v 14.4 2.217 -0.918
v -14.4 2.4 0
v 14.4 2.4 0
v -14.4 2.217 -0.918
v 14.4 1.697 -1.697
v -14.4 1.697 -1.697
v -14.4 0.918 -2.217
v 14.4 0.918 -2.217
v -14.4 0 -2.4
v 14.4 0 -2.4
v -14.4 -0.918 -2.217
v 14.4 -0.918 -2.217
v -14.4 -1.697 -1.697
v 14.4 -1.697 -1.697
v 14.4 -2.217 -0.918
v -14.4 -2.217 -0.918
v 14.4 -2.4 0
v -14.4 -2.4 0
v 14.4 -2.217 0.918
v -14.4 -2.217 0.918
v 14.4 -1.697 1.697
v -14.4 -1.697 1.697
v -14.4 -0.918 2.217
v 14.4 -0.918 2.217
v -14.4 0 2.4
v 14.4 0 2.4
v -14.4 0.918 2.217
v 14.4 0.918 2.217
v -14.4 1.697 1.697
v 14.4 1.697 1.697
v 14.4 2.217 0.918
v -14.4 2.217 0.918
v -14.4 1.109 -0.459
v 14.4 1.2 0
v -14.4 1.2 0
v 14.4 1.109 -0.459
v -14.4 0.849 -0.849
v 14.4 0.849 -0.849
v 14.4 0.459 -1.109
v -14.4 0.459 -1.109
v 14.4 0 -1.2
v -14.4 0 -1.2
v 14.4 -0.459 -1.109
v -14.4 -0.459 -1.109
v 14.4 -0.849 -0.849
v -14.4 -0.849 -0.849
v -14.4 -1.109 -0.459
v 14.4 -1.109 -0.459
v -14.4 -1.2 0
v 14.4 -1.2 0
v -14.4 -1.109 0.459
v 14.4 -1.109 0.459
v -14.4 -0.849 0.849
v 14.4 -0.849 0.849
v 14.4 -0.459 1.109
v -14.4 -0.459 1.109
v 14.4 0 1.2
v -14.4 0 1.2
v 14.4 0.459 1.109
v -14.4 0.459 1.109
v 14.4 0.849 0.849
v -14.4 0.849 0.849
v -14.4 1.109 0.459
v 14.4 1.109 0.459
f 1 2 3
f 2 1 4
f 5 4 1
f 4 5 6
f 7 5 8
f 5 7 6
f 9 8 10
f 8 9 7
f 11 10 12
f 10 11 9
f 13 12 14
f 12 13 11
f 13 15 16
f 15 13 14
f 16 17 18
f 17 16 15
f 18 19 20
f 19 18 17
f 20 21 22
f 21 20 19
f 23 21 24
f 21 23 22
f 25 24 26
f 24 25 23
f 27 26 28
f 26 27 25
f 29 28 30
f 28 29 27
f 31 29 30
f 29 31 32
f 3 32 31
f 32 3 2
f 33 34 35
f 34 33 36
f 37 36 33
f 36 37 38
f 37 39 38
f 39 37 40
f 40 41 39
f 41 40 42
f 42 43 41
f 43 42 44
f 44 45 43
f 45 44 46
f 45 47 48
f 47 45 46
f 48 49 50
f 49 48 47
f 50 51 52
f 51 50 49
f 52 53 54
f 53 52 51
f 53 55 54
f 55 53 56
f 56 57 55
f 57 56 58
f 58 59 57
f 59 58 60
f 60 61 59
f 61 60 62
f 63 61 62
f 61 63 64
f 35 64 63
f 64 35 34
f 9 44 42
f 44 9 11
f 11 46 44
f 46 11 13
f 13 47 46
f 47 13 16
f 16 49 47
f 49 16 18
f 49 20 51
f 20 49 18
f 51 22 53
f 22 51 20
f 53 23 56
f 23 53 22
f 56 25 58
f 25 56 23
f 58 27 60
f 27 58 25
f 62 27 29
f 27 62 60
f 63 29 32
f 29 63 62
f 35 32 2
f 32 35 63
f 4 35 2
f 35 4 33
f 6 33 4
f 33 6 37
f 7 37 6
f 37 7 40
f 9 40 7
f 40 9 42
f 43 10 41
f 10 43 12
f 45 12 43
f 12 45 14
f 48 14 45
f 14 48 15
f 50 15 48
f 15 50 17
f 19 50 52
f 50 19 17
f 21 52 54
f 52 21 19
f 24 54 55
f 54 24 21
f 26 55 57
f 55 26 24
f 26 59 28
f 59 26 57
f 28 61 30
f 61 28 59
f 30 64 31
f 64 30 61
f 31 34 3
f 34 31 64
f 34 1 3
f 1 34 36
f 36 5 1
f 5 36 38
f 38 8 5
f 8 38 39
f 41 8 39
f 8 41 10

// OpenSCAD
// file: ../p/4-4disc.scad
use <../lib.scad>
$fa=1; $fs=0.2;
function ldraw_lib__4_4disc(realsolid=false) = [
// 0 Disc 1.0
// 0 Name: 4-4disc.dat
// 0 Author: James Jessiman
// 0 !LDRAW_ORG Primitive UPDATE 2002-02
// 0 !LICENSE Licensed under CC BY 2.0 and CC BY 4.0 : see CAreadme.txt
// 
// 0 BFC CERTIFY CCW
  [0,"BFC","CERTIFY"],
  [0,"BFC","CCW"],
// 
// 0 !HISTORY 1998-12-15 [PTadmin] Official Update 1998-10
// 0 !HISTORY 2002-03-23 [sbliss] Added BFC statement
// 0 !HISTORY 2002-04-25 [PTadmin] Official Update 2002-02
// 0 !HISTORY 2007-06-24 [PTadmin] Header formatted for Contributor Agreement
// 0 !HISTORY 2008-07-01 [PTadmin] Official Update 2008-01
// 
// 
// 3 16 0 0 0 1 0 0 0.9239 0 0.3827
  [3,16,0,0,0,1,0,0,0.9239,0,0.3827],
// 3 16 0 0 0 0.9239 0 0.3827 0.7071 0 0.7071
  [3,16,0,0,0,0.9239,0,0.3827,0.7071,0,0.7071],
// 3 16 0 0 0 0.7071 0 0.7071 0.3827 0 0.9239
  [3,16,0,0,0,0.7071,0,0.7071,0.3827,0,0.9239],
// 3 16 0 0 0 0.3827 0 0.9239 0 0 1
  [3,16,0,0,0,0.3827,0,0.9239,0,0,1],
// 3 16 0 0 0 0 0 1 -0.3827 0 0.9239
  [3,16,0,0,0,0,0,1,-0.3827,0,0.9239],
// 3 16 0 0 0 -0.3827 0 0.9239 -0.7071 0 0.7071
  [3,16,0,0,0,-0.3827,0,0.9239,-0.7071,0,0.7071],
// 3 16 0 0 0 -0.7071 0 0.7071 -0.9239 0 0.3827
  [3,16,0,0,0,-0.7071,0,0.7071,-0.9239,0,0.3827],
// 3 16 0 0 0 -0.9239 0 0.3827 -1 0 -0
  [3,16,0,0,0,-0.9239,0,0.3827,-1,0,-0],
// 3 16 0 0 0 -1 0 -0 -0.9239 0 -0.3827
  [3,16,0,0,0,-1,0,-0,-0.9239,0,-0.3827],
// 3 16 0 0 0 -0.9239 0 -0.3827 -0.7071 0 -0.7071
  [3,16,0,0,0,-0.9239,0,-0.3827,-0.7071,0,-0.7071],
// 3 16 0 0 0 -0.7071 0 -0.7071 -0.3827 0 -0.9239
  [3,16,0,0,0,-0.7071,0,-0.7071,-0.3827,0,-0.9239],
// 3 16 0 0 0 -0.3827 0 -0.9239 0 0 -1
  [3,16,0,0,0,-0.3827,0,-0.9239,0,0,-1],
// 3 16 0 0 0 0 0 -1 0.3827 0 -0.9239
  [3,16,0,0,0,0,0,-1,0.3827,0,-0.9239],
// 3 16 0 0 0 0.3827 0 -0.9239 0.7071 0 -0.7071
  [3,16,0,0,0,0.3827,0,-0.9239,0.7071,0,-0.7071],
// 3 16 0 0 0 0.7071 0 -0.7071 0.9239 0 -0.3827
  [3,16,0,0,0,0.7071,0,-0.7071,0.9239,0,-0.3827],
// 3 16 0 0 0 0.9239 0 -0.3827 1 0 0
  [3,16,0,0,0,0.9239,0,-0.3827,1,0,0],
// 0
];
module ldraw_lib__4_4disc(step=0, col=false, unit=2/5, alt=false, line=0.2, solid=!$preview)
    makepoly(ldraw_lib__4_4disc(solid), step=step, col=col, unit=unit, alt=alt, line=line, solid=solid);
ldraw_lib__4_4disc(line=0.2);
// file: ../p/stud3.scad
use <../lib.scad>
use <4-4cyli.scad>
use <4-4disc.scad>
use <4-4edge.scad>
$fa=1; $fs=0.2;
function ldraw_lib__stud3(realsolid=false) = realsolid ? 
    [openscad(translate([0,0,-eps()], o=cylinder(4+eps(), r=4)),2)] : [
// 0 Stud Tube Solid
// 0 Name: stud3.dat
// 0 Author: James Jessiman
// 0 !LDRAW_ORG Primitive UPDATE 2012-01
// 0 !LICENSE Licensed under CC BY 2.0 and CC BY 4.0 : see CAreadme.txt
// 
// 0 BFC CERTIFY CCW
  [0,"BFC","CERTIFY"],
  [0,"BFC","CCW"],
// 
// 0 !HISTORY 2002-04-04 [sbliss] Modified for BFC compliance
// 0 !HISTORY 2002-04-25 [PTadmin] Official Update 2002-02
// 0 !HISTORY 2007-06-24 [PTadmin] Header formatted for Contributor Agreement
// 0 !HISTORY 2008-07-01 [PTadmin] Official Update 2008-01
// 0 !HISTORY 2012-02-16 [Philo] Changed to CCW
// 0 !HISTORY 2012-03-30 [PTadmin] Official Update 2012-01
// 
// 
// 1 16 0 -4 0 4 0 0 0 1 0 0 0 4 4-4edge.dat
  [1,16,0,-4,0,4,0,0,0,1,0,0,0,4, ldraw_lib__4_4edge(realsolid)],
// 1 16 0 0 0 4 0 0 0 1 0 0 0 4 4-4edge.dat
  [1,16,0,0,0,4,0,0,0,1,0,0,0,4, ldraw_lib__4_4edge(realsolid)],
// 1 16 0 -4 0 4 0 0 0 1 0 0 0 4 4-4disc.dat
  [1,16,0,-4,0,4,0,0,0,1,0,0,0,4, ldraw_lib__4_4disc(realsolid)],
// 1 16 0 -4 0 4 0 0 0 4 0 0 0 4 4-4cyli.dat
  [1,16,0,-4,0,4,0,0,0,4,0,0,0,4, ldraw_lib__4_4cyli(realsolid)],
];
module ldraw_lib__stud3(step=0, col=false, unit=2/5, alt=false, line=0.2, solid=!$preview)
    makepoly(ldraw_lib__stud3(solid), step=step, col=col, unit=unit, alt=alt, line=line, solid=solid);
ldraw_lib__stud3(line=0.2);
// file: ../p/stud.scad
use <../lib.scad>
use <4-4cyli.scad>
use <4-4disc.scad>
use <4-4edge.scad>
$fa=1; $fs=0.2;
function ldraw_lib__stud(realsolid=false) = realsolid ? 
    [openscad(translate([0,0,-eps()], o=cylinder(4+eps(), r=6)),2)] : [
// 0 Stud
// 0 Name: stud.dat
// 0 Author: James Jessiman
// 0 !LDRAW_ORG Primitive UPDATE 2012-01
// 0 !LICENSE Licensed under CC BY 2.0 and CC BY 4.0 : see CAreadme.txt
// 
// 0 BFC CERTIFY CCW
  [0,"BFC","CERTIFY"],
  [0,"BFC","CCW"],
// 
// 0 !HISTORY 2002-04-04 [sbliss] Modified for BFC compliance
// 0 !HISTORY 2002-04-25 [PTadmin] Official Update 2002-02
// 0 !HISTORY 2007-06-24 [PTadmin] Header formatted for Contributor Agreement
// 0 !HISTORY 2008-07-01 [PTadmin] Official Update 2008-01
// 0 !HISTORY 2012-02-16 [Philo] Changed to CCW
// 0 !HISTORY 2012-03-30 [PTadmin] Official Update 2012-01
// 
// 
// 1 16 0 0 0 6 0 0 0 1 0 0 0 6 4-4edge.dat
  [1,16,0,0,0,6,0,0,0,1,0,0,0,6, ldraw_lib__4_4edge(realsolid)],
// 1 16 0 -4 0 6 0 0 0 1 0 0 0 6 4-4edge.dat
  [1,16,0,-4,0,6,0,0,0,1,0,0,0,6, ldraw_lib__4_4edge(realsolid)],
// 1 16 0 0 0 6 0 0 0 -4 0 0 0 6 4-4cyli.dat
  [1,16,0,0,0,6,0,0,0,-4,0,0,0,6, ldraw_lib__4_4cyli(realsolid)],
// 1 16 0 -4 0 6 0 0 0 1 0 0 0 6 4-4disc.dat
  [1,16,0,-4,0,6,0,0,0,1,0,0,0,6, ldraw_lib__4_4disc(realsolid)],
];
module ldraw_lib__stud(step=0, col=false, unit=2/5, alt=false, line=0.2, solid=!$preview)
    makepoly(ldraw_lib__stud(solid), step=step, col=col, unit=unit, alt=alt, line=line, solid=solid);
ldraw_lib__stud(line=0.2);
// file: ../p/box5.scad
use <../lib.scad>
$fa=1; $fs=0.2;
function ldraw_lib__box5(realsolid=false) = [
// 0 Box with 5 Faces and All Edges
// 0 Name: box5.dat
// 0 Author: James Jessiman
// 0 !LDRAW_ORG Primitive UPDATE 2012-01
// 0 !LICENSE Licensed under CC BY 2.0 and CC BY 4.0 : see CAreadme.txt
// 
// 0 BFC CERTIFY CCW
  [0,"BFC","CERTIFY"],
  [0,"BFC","CCW"],
// 
// 0 !HISTORY 2002-04-03 [sbliss] Modified for BFC compliance
// 0 !HISTORY 2002-04-25 [PTadmin] Official Update 2002-02
// 0 !HISTORY 2007-06-24 [PTadmin] Header formatted for Contributor Agreement
// 0 !HISTORY 2008-07-01 [PTadmin] Official Update 2008-01
// 0 !HISTORY 2012-02-16 [Philo] Changed to CCW
// 0 !HISTORY 2012-03-30 [PTadmin] Official Update 2012-01
// 
// 
// 2 24 1 1 1 -1 1 1
  [2,24,1,1,1,-1,1,1],
// 2 24 -1 1 1 -1 1 -1
  [2,24,-1,1,1,-1,1,-1],
// 2 24 -1 1 -1 1 1 -1
  [2,24,-1,1,-1,1,1,-1],
// 2 24 1 1 -1 1 1 1
  [2,24,1,1,-1,1,1,1],
// 2 24 1 0 1 -1 0 1
  [2,24,1,0,1,-1,0,1],
// 2 24 -1 0 1 -1 0 -1
  [2,24,-1,0,1,-1,0,-1],
// 2 24 -1 0 -1 1 0 -1
  [2,24,-1,0,-1,1,0,-1],
// 2 24 1 0 -1 1 0 1
  [2,24,1,0,-1,1,0,1],
// 2 24 1 0 1 1 1 1
  [2,24,1,0,1,1,1,1],
// 2 24 -1 0 1 -1 1 1
  [2,24,-1,0,1,-1,1,1],
// 2 24 1 0 -1 1 1 -1
  [2,24,1,0,-1,1,1,-1],
// 2 24 -1 0 -1 -1 1 -1
  [2,24,-1,0,-1,-1,1,-1],
// 4 16 -1 1 1 1 1 1 1 1 -1 -1 1 -1
  [4,16,-1,1,1,1,1,1,1,1,-1,-1,1,-1],
// 4 16 -1 1 1 -1 0 1 1 0 1 1 1 1
  [4,16,-1,1,1,-1,0,1,1,0,1,1,1,1],
// 4 16 -1 1 -1 -1 0 -1 -1 0 1 -1 1 1
  [4,16,-1,1,-1,-1,0,-1,-1,0,1,-1,1,1],
// 4 16 1 1 -1 1 0 -1 -1 0 -1 -1 1 -1
  [4,16,1,1,-1,1,0,-1,-1,0,-1,-1,1,-1],
// 4 16 1 1 1 1 0 1 1 0 -1 1 1 -1
  [4,16,1,1,1,1,0,1,1,0,-1,1,1,-1],
];
module ldraw_lib__box5(step=0, col=false, unit=2/5, alt=false, line=0.2, solid=!$preview)
    makepoly(ldraw_lib__box5(solid), step=step, col=col, unit=unit, alt=alt, line=line, solid=solid);
ldraw_lib__box5(line=0.2);
// file: ../p/box4t.scad
use <../lib.scad>
$fa=1; $fs=0.2;
function ldraw_lib__box4t(realsolid=false) = [
// 0 Box with 4 Adjacent Faces and All Edges
// 0 Name: box4t.dat
// 0 Author: Tore Eriksson [Tore_Eriksson]
// 0 !LDRAW_ORG Primitive UPDATE 2003-02
// 0 !LICENSE Licensed under CC BY 2.0 and CC BY 4.0 : see CAreadme.txt
// 
// 0 BFC CERTIFY CCW
  [0,"BFC","CERTIFY"],
  [0,"BFC","CCW"],
// 
// 0 !HISTORY 1997-09-29 [PTadmin] Official Update 1997-15
// 0 !HISTORY 2002-08-31 [izanette] Modified with WINDZ for BFC compliance
// 0 !HISTORY 2003-08-01 [PTadmin] Official Update 2003-02
// 0 !HISTORY 2007-06-24 [PTadmin] Header formatted for Contributor Agreement
// 0 !HISTORY 2008-07-01 [PTadmin] Official Update 2008-01
// 
// 
// 2 24 1 1 1 -1 1 1
  [2,24,1,1,1,-1,1,1],
// 2 24 -1 1 1 -1 1 -1
  [2,24,-1,1,1,-1,1,-1],
// 2 24 -1 1 -1 1 1 -1
  [2,24,-1,1,-1,1,1,-1],
// 2 24 1 1 -1 1 1 1
  [2,24,1,1,-1,1,1,1],
// 2 24 1 0 1 -1 0 1
  [2,24,1,0,1,-1,0,1],
// 2 24 -1 0 1 -1 0 -1
  [2,24,-1,0,1,-1,0,-1],
// 2 24 -1 0 -1 1 0 -1
  [2,24,-1,0,-1,1,0,-1],
// 2 24 1 0 -1 1 0 1
  [2,24,1,0,-1,1,0,1],
// 2 24 1 0 1 1 1 1
  [2,24,1,0,1,1,1,1],
// 2 24 -1 0 1 -1 1 1
  [2,24,-1,0,1,-1,1,1],
// 2 24 1 0 -1 1 1 -1
  [2,24,1,0,-1,1,1,-1],
// 2 24 -1 0 -1 -1 1 -1
  [2,24,-1,0,-1,-1,1,-1],
// 4 16 1 1 1 1 1 -1 -1 1 -1 -1 1 1
  [4,16,1,1,1,1,1,-1,-1,1,-1,-1,1,1],
// 4 16 1 1 1 -1 1 1 -1 0 1 1 0 1
  [4,16,1,1,1,-1,1,1,-1,0,1,1,0,1],
// 4 16 -1 1 1 -1 1 -1 -1 0 -1 -1 0 1
  [4,16,-1,1,1,-1,1,-1,-1,0,-1,-1,0,1],
// 0 4 16 -1 1 -1 -1 0 -1 1 0 -1 1 1 -1
// 4 16 1 1 -1 1 1 1 1 0 1 1 0 -1
  [4,16,1,1,-1,1,1,1,1,0,1,1,0,-1],
// 0
];
module ldraw_lib__box4t(step=0, col=false, unit=2/5, alt=false, line=0.2, solid=!$preview)
    makepoly(ldraw_lib__box4t(solid), step=step, col=col, unit=unit, alt=alt, line=line, solid=solid);
ldraw_lib__box4t(line=0.2);
// file: s/3004s01.scad
use <../../lib.scad>
use <../../p/box4t.scad>
use <../../p/box5.scad>
use <../../p/stud.scad>
use <../../p/stud3.scad>
$fa=1; $fs=0.2;
function ldraw_lib__s__3004s01(realsolid=false) = [
// 0 ~Brick  1 x  2 without Front Face
// 0 Name: s\3004s01.dat
// 0 Author: James Jessiman
// 0 !LDRAW_ORG Subpart UPDATE 2003-03
// 0 !LICENSE Licensed under CC BY 2.0 and CC BY 4.0 : see CAreadme.txt
// 
// 0 BFC CERTIFY CCW
  [0,"BFC","CERTIFY"],
  [0,"BFC","CCW"],
// 
// 0 !HISTORY 2003-09-07 [jriley] Subfiling, BFC
// 0 !HISTORY 2003-12-19 [PTadmin] Official Update 2003-03
// 0 !HISTORY 2007-08-29 [PTadmin] Header formatted for Contributor Agreement
// 0 !HISTORY 2008-07-01 [PTadmin] Official Update 2008-01
// 
// 
// 1 16 0 4 0 1 0 0 0 -5 0 0 0 1 stud3.dat
  [1,16,0,4,0,1,0,0,0,-5,0,0,0,1, ldraw_lib__stud3(realsolid)],
// 0 BFC INVERTNEXT
  [0,"BFC","INVERTNEXT"],
// 1 16 0 24 0 16 0 0 0 -20 0 0 0 6 box5.dat
  [1,16,0,24,0,16,0,0,0,-20,0,0,0,6, ldraw_lib__box5(realsolid)],
// 4 16 20 24 10 16 24 6 -16 24 6 -20 24 10
  [4,16,20,24,10,16,24,6,-16,24,6,-20,24,10],
// 4 16 -20 24 10 -16 24 6 -16 24 -6 -20 24 -10
  [4,16,-20,24,10,-16,24,6,-16,24,-6,-20,24,-10],
// 4 16 -20 24 -10 -16 24 -6 16 24 -6 20 24 -10
  [4,16,-20,24,-10,-16,24,-6,16,24,-6,20,24,-10],
// 4 16 20 24 -10 16 24 -6 16 24 6 20 24 10
  [4,16,20,24,-10,16,24,-6,16,24,6,20,24,10],
// 1 16 0 24 0 20 0 0 0 -24 0 0 0 10 box4t.dat
  [1,16,0,24,0,20,0,0,0,-24,0,0,0,10, ldraw_lib__box4t(realsolid)],
// 1 16 10 0 0 1 0 0 0 1 0 0 0 1 stud.dat
  [1,16,10,0,0,1,0,0,0,1,0,0,0,1, ldraw_lib__stud(realsolid)],
// 1 16 -10 0 0 1 0 0 0 1 0 0 0 1 stud.dat
  [1,16,-10,0,0,1,0,0,0,1,0,0,0,1, ldraw_lib__stud(realsolid)],
// 0
];
module ldraw_lib__s__3004s01(step=0, col=false, unit=2/5, alt=false, line=0.2, solid=!$preview)
    makepoly(ldraw_lib__s__3004s01(solid), step=step, col=col, unit=unit, alt=alt, line=line, solid=solid);
ldraw_lib__s__3004s01(line=0.2);
// file: 3004.scad
use <../lib.scad>
use <s/3004s01.scad>
$fa=1; $fs=0.2;
function ldraw_lib__3004(realsolid=false) = [
// 0 Brick  1 x  2
// 0 Name: 3004.dat
// 0 Author: James Jessiman
// 0 !LDRAW_ORG Part UPDATE 2022-05
// 0 !LICENSE Licensed under CC BY 2.0 and CC BY 4.0 : see CAreadme.txt
// 
// 0 BFC CERTIFY CCW
  [0,"BFC","CERTIFY"],
  [0,"BFC","CCW"],
// 
// 0 !HISTORY 2001-10-26 [PTadmin] Official Update 2001-01
// 0 !HISTORY 2002-05-07 {unknown} BFC Certification
// 0 !HISTORY 2002-06-11 [PTadmin] Official Update 2002-03
// 0 !HISTORY 2007-05-07 [PTadmin] Header formatted for Contributor Agreement
// 0 !HISTORY 2008-07-01 [PTadmin] Official Update 2008-01
// 0 !HISTORY 2022-08-04 [MagFors] Using subfile
// 0 !HISTORY 2022-09-15 [PTadmin] Official Update 2022-05
// 
// 
// 1 16 0 0 0 1 0 0 0 1 0 0 0 1 s\3004s01.dat
  [1,16,0,0,0,1,0,0,0,1,0,0,0,1, ldraw_lib__s__3004s01(realsolid)],
// 4 16 -20 24 -10 20 24 -10 20 0 -10 -20 0 -10
  [4,16,-20,24,-10,20,24,-10,20,0,-10,-20,0,-10],
];
module ldraw_lib__3004(step=0, col=false, unit=2/5, alt=false, line=0.2, solid=!$preview)
    makepoly(ldraw_lib__3004(solid), step=step, col=col, unit=unit, alt=alt, line=line, solid=solid);
ldraw_lib__3004(line=0.2);
// file: ../p/4-4ring1.scad
use <../lib.scad>
$fa=1; $fs=0.2;
function ldraw_lib__4_4ring1(realsolid=false) = [
// 0 Ring  1 x 1.0
// 0 Name: 4-4ring1.dat
// 0 Author: James Jessiman
// 0 !LDRAW_ORG Primitive UPDATE 2009-01
// 0 !LICENSE Licensed under CC BY 2.0 and CC BY 4.0 : see CAreadme.txt
// 
// 0 BFC CERTIFY CCW
  [0,"BFC","CERTIFY"],
  [0,"BFC","CCW"],
// 
// 0 !HISTORY 1998-12-15 [PTadmin] Official Update 1998-10
// 0 !HISTORY 2002-04-08 [BrickCaster] Modified for BFC compliance
// 0 !HISTORY 2002-04-25 [PTadmin] Official Update 2002-02
// 0 !HISTORY 2007-06-24 [PTadmin] Header formatted for Contributor Agreement
// 0 !HISTORY 2008-07-01 [PTadmin] Official Update 2008-01
// 0 !HISTORY 2008-08-26 [cwdee] Switch polygon winding and rename
// 0 !HISTORY 2009-05-02 [PTadmin] Official Update 2009-01
// 
// 
// 4 16 -0.7654 0 1.8478 -0.3827 0 0.9239 0 0 1 0 0 2
  [4,16,-0.7654,0,1.8478,-0.3827,0,0.9239,0,0,1,0,0,2],
// 4 16 -1.4142 0 1.4142 -0.7071 0 0.7071 -0.3827 0 0.9239 -0.7654 0 1.8478
  [4,16,-1.4142,0,1.4142,-0.7071,0,0.7071,-0.3827,0,0.9239,-0.7654,0,1.8478],
// 4 16 -1.8478 0 0.7654 -0.9239 0 0.3827 -0.7071 0 0.7071 -1.4142 0 1.41420
  [4,16,-1.8478,0,0.7654,-0.9239,0,0.3827,-0.7071,0,0.7071,-1.4142,0,1.41420],
// 4 16 -2 0 0 -1 0 0 -0.9239 0 0.3827 -1.8478 0 0.7654
  [4,16,-2,0,0,-1,0,0,-0.9239,0,0.3827,-1.8478,0,0.7654],
// 4 16 -1.8478 0 -0.7654 -0.9239 0 -0.3827 -1 0 0 -2 0 0
  [4,16,-1.8478,0,-0.7654,-0.9239,0,-0.3827,-1,0,0,-2,0,0],
// 4 16 -1.4142 0 -1.4142 -0.7071 0 -0.7071 -0.9239 0 -0.3827 -1.8478 0 -0.7654
  [4,16,-1.4142,0,-1.4142,-0.7071,0,-0.7071,-0.9239,0,-0.3827,-1.8478,0,-0.7654],
// 4 16 -0.7654 0 -1.8478 -0.3827 0 -0.9239 -0.7071 0 -0.7071 -1.4142 0 -1.4142
  [4,16,-0.7654,0,-1.8478,-0.3827,0,-0.9239,-0.7071,0,-0.7071,-1.4142,0,-1.4142],
// 4 16 0 0 -2 0 0 -1 -0.3827 0 -0.9239 -0.7654 0 -1.8478
  [4,16,0,0,-2,0,0,-1,-0.3827,0,-0.9239,-0.7654,0,-1.8478],
// 4 16 0.7654 0 -1.8478 0.3827 0 -0.9239 0 0 -1 0 0 -2
  [4,16,0.7654,0,-1.8478,0.3827,0,-0.9239,0,0,-1,0,0,-2],
// 4 16 1.4142 0 -1.4142 0.7071 0 -0.7071 0.3827 0 -0.9239 0.7654 0 -1.8478
  [4,16,1.4142,0,-1.4142,0.7071,0,-0.7071,0.3827,0,-0.9239,0.7654,0,-1.8478],
// 4 16 1.8478 0 -0.7654 0.9239 0 -0.3827 0.7071 0 -0.7071 1.4142 0 -1.4142
  [4,16,1.8478,0,-0.7654,0.9239,0,-0.3827,0.7071,0,-0.7071,1.4142,0,-1.4142],
// 4 16 2 0 0 1 0 0 0.9239 0 -0.3827 1.8478 0 -0.7654
  [4,16,2,0,0,1,0,0,0.9239,0,-0.3827,1.8478,0,-0.7654],
// 4 16 1.8478 0 0.7654 0.9239 0 0.3827 1 0 0 2 0 0
  [4,16,1.8478,0,0.7654,0.9239,0,0.3827,1,0,0,2,0,0],
// 4 16 1.4142 0 1.4142 0.7071 0 0.7071 0.9239 0 0.3827 1.8478 0 0.7654
  [4,16,1.4142,0,1.4142,0.7071,0,0.7071,0.9239,0,0.3827,1.8478,0,0.7654],
// 4 16 0.7654 0 1.8478 0.3827 0 0.9239 0.7071 0 0.7071 1.4142 0 1.4142
  [4,16,0.7654,0,1.8478,0.3827,0,0.9239,0.7071,0,0.7071,1.4142,0,1.4142],
// 4 16 0 0 2 0 0 1 0.3827 0 0.9239 0.7654 0 1.8478
  [4,16,0,0,2,0,0,1,0.3827,0,0.9239,0.7654,0,1.8478],
// 0
];
module ldraw_lib__4_4ring1(step=0, col=false, unit=2/5, alt=false, line=0.2, solid=!$preview)
    makepoly(ldraw_lib__4_4ring1(solid), step=step, col=col, unit=unit, alt=alt, line=line, solid=solid);
ldraw_lib__4_4ring1(line=0.2);
// file: ../p/4-4edge.scad
use <../lib.scad>
$fa=1; $fs=0.2;
function ldraw_lib__4_4edge(realsolid=false) = [
// 0 Circle 1.0
// 0 Name: 4-4edge.dat
// 0 Author: James Jessiman
// 0 !LDRAW_ORG Primitive UPDATE 2017-01
// 0 !LICENSE Licensed under CC BY 2.0 and CC BY 4.0 : see CAreadme.txt
// 
// 0 BFC CERTIFY CCW
  [0,"BFC","CERTIFY"],
  [0,"BFC","CCW"],
// 
// 0 !HISTORY 1998-12-15 [PTadmin] Official Update 1998-10
// 0 !HISTORY 2005-12-28 [PTadmin] Official Update 2005-01
// 0 !HISTORY 2007-06-24 [PTadmin] Header formatted for Contributor Agreement
// 0 !HISTORY 2008-07-01 [PTadmin] Official Update 2008-01
// 0 !HISTORY 2017-01-15 [Steffen] BFCed
// 0 !HISTORY 2017-12-30 [PTadmin] Official Update 2017-01
// 
// 
// 2 24 1 0 0 0.9239 0 0.3827
  [2,24,1,0,0,0.9239,0,0.3827],
// 2 24 0.9239 0 0.3827 0.7071 0 0.7071
  [2,24,0.9239,0,0.3827,0.7071,0,0.7071],
// 2 24 0.7071 0 0.7071 0.3827 0 0.9239
  [2,24,0.7071,0,0.7071,0.3827,0,0.9239],
// 2 24 0.3827 0 0.9239 0 0 1
  [2,24,0.3827,0,0.9239,0,0,1],
// 2 24 0 0 1 -0.3827 0 0.9239
  [2,24,0,0,1,-0.3827,0,0.9239],
// 2 24 -0.3827 0 0.9239 -0.7071 0 0.7071
  [2,24,-0.3827,0,0.9239,-0.7071,0,0.7071],
// 2 24 -0.7071 0 0.7071 -0.9239 0 0.3827
  [2,24,-0.7071,0,0.7071,-0.9239,0,0.3827],
// 2 24 -0.9239 0 0.3827 -1 0 -0
  [2,24,-0.9239,0,0.3827,-1,0,-0],
// 2 24 -1 0 -0 -0.9239 0 -0.3827
  [2,24,-1,0,-0,-0.9239,0,-0.3827],
// 2 24 -0.9239 0 -0.3827 -0.7071 0 -0.7071
  [2,24,-0.9239,0,-0.3827,-0.7071,0,-0.7071],
// 2 24 -0.7071 0 -0.7071 -0.3827 0 -0.9239
  [2,24,-0.7071,0,-0.7071,-0.3827,0,-0.9239],
// 2 24 -0.3827 0 -0.9239 0 0 -1
  [2,24,-0.3827,0,-0.9239,0,0,-1],
// 2 24 0 0 -1 0.3827 0 -0.9239
  [2,24,0,0,-1,0.3827,0,-0.9239],
// 2 24 0.3827 0 -0.9239 0.7071 0 -0.7071
  [2,24,0.3827,0,-0.9239,0.7071,0,-0.7071],
// 2 24 0.7071 0 -0.7071 0.9239 0 -0.3827
  [2,24,0.7071,0,-0.7071,0.9239,0,-0.3827],
// 2 24 0.9239 0 -0.3827 1 0 0
  [2,24,0.9239,0,-0.3827,1,0,0],
];
module ldraw_lib__4_4edge(step=0, col=false, unit=2/5, alt=false, line=0.2, solid=!$preview)
    makepoly(ldraw_lib__4_4edge(solid), step=step, col=col, unit=unit, alt=alt, line=line, solid=solid);
ldraw_lib__4_4edge(line=0.2);
// file: ../p/4-4cyli.scad
use <../lib.scad>
$fa=1; $fs=0.2;
function ldraw_lib__4_4cyli(realsolid=false) = [
// 0 Cylinder 1.0
// 0 Name: 4-4cyli.dat
// 0 Author: James Jessiman
// 0 !LDRAW_ORG Primitive UPDATE 2005-01
// 0 !LICENSE Licensed under CC BY 2.0 and CC BY 4.0 : see CAreadme.txt
// 
// 0 BFC CERTIFY CCW
  [0,"BFC","CERTIFY"],
  [0,"BFC","CCW"],
// 
// 0 !HISTORY 1998-12-15 [PTadmin] Official Update 1998-10
// 0 !HISTORY 2002-03-23 [sbliss] Added BFC statement; merged headers from files in distributions LDraw 0.27 and Complete.
// 0 !HISTORY 2002-04-25 [PTadmin] Official Update 2002-02
// 0 !HISTORY 2004-12-14 [guyvivan] BFC CCW
// 0 !HISTORY 2005-12-28 [PTadmin] Official Update 2005-01
// 0 !HISTORY 2007-06-24 [PTadmin] Header formatted for Contributor Agreement
// 0 !HISTORY 2008-07-01 [PTadmin] Official Update 2008-01
// 
// 
// 4 16 1 1 0 0.9239 1 0.3827 0.9239 0 0.3827 1 0 0
  [4,16,1,1,0,0.9239,1,0.3827,0.9239,0,0.3827,1,0,0],
// 5 24 1 0 0 1 1 0 0.9239 0 0.3827 0.9239 0 -0.3827
  [5,24,1,0,0,1,1,0,0.9239,0,0.3827,0.9239,0,-0.3827],
// 4 16 0.9239 1 0.3827 0.7071 1 0.7071 0.7071 0 0.7071 0.9239 0 0.3827
  [4,16,0.9239,1,0.3827,0.7071,1,0.7071,0.7071,0,0.7071,0.9239,0,0.3827],
// 5 24 0.9239 0 0.3827 0.9239 1 0.3827 0.7071 0 0.7071 1 0 0
  [5,24,0.9239,0,0.3827,0.9239,1,0.3827,0.7071,0,0.7071,1,0,0],
// 4 16 0.7071 1 0.7071 0.3827 1 0.9239 0.3827 0 0.9239 0.7071 0 0.7071
  [4,16,0.7071,1,0.7071,0.3827,1,0.9239,0.3827,0,0.9239,0.7071,0,0.7071],
// 5 24 0.7071 0 0.7071 0.7071 1 0.7071 0.3827 0 0.9239 0.9239 0 0.3827
  [5,24,0.7071,0,0.7071,0.7071,1,0.7071,0.3827,0,0.9239,0.9239,0,0.3827],
// 4 16 0.3827 1 0.9239 0 1 1 0 0 1 0.3827 0 0.9239
  [4,16,0.3827,1,0.9239,0,1,1,0,0,1,0.3827,0,0.9239],
// 5 24 0.3827 0 0.9239 0.3827 1 0.9239 0 0 1 0.7071 0 0.7071
  [5,24,0.3827,0,0.9239,0.3827,1,0.9239,0,0,1,0.7071,0,0.7071],
// 4 16 0 1 1 -0.3827 1 0.9239 -0.3827 0 0.9239 0 0 1
  [4,16,0,1,1,-0.3827,1,0.9239,-0.3827,0,0.9239,0,0,1],
// 5 24 0 0 1 0 1 1 -0.3827 0 0.9239 0.3827 0 0.9239
  [5,24,0,0,1,0,1,1,-0.3827,0,0.9239,0.3827,0,0.9239],
// 4 16 -0.3827 1 0.9239 -0.7071 1 0.7071 -0.7071 0 0.7071 -0.3827 0 0.9239
  [4,16,-0.3827,1,0.9239,-0.7071,1,0.7071,-0.7071,0,0.7071,-0.3827,0,0.9239],
// 5 24 -0.3827 0 0.9239 -0.3827 1 0.9239 -0.7071 0 0.7071 0 0 1
  [5,24,-0.3827,0,0.9239,-0.3827,1,0.9239,-0.7071,0,0.7071,0,0,1],
// 4 16 -0.7071 1 0.7071 -0.9239 1 0.3827 -0.9239 0 0.3827 -0.7071 0 0.7071
  [4,16,-0.7071,1,0.7071,-0.9239,1,0.3827,-0.9239,0,0.3827,-0.7071,0,0.7071],
// 5 24 -0.7071 0 0.7071 -0.7071 1 0.7071 -0.9239 0 0.3827 -0.3827 0 0.9239
  [5,24,-0.7071,0,0.7071,-0.7071,1,0.7071,-0.9239,0,0.3827,-0.3827,0,0.9239],
// 4 16 -0.9239 1 0.3827 -1 1 0 -1 0 0 -0.9239 0 0.3827
  [4,16,-0.9239,1,0.3827,-1,1,0,-1,0,0,-0.9239,0,0.3827],
// 5 24 -0.9239 0 0.3827 -0.9239 1 0.3827 -1 0 0 -0.7071 0 0.7071
  [5,24,-0.9239,0,0.3827,-0.9239,1,0.3827,-1,0,0,-0.7071,0,0.7071],
// 4 16 -1 1 0 -0.9239 1 -0.3827 -0.9239 0 -0.3827 -1 0 0
  [4,16,-1,1,0,-0.9239,1,-0.3827,-0.9239,0,-0.3827,-1,0,0],
// 5 24 -1 0 0 -1 1 0 -0.9239 0 -0.3827 -0.9239 0 0.3827
  [5,24,-1,0,0,-1,1,0,-0.9239,0,-0.3827,-0.9239,0,0.3827],
// 4 16 -0.9239 1 -0.3827 -0.7071 1 -0.7071 -0.7071 0 -0.7071 -0.9239 0 -0.3827
  [4,16,-0.9239,1,-0.3827,-0.7071,1,-0.7071,-0.7071,0,-0.7071,-0.9239,0,-0.3827],
// 5 24 -0.9239 0 -0.3827 -0.9239 1 -0.3827 -0.7071 0 -0.7071 -1 0 0
  [5,24,-0.9239,0,-0.3827,-0.9239,1,-0.3827,-0.7071,0,-0.7071,-1,0,0],
// 4 16 -0.7071 1 -0.7071 -0.3827 1 -0.9239 -0.3827 0 -0.9239 -0.7071 0 -0.7071
  [4,16,-0.7071,1,-0.7071,-0.3827,1,-0.9239,-0.3827,0,-0.9239,-0.7071,0,-0.7071],
// 5 24 -0.7071 0 -0.7071 -0.7071 1 -0.7071 -0.3827 0 -0.9239 -0.9239 0 -0.3827
  [5,24,-0.7071,0,-0.7071,-0.7071,1,-0.7071,-0.3827,0,-0.9239,-0.9239,0,-0.3827],
// 4 16 -0.3827 1 -0.9239 0 1 -1 0 0 -1 -0.3827 0 -0.9239
  [4,16,-0.3827,1,-0.9239,0,1,-1,0,0,-1,-0.3827,0,-0.9239],
// 5 24 -0.3827 0 -0.9239 -0.3827 1 -0.9239 0 0 -1 -0.7071 0 -0.7071
  [5,24,-0.3827,0,-0.9239,-0.3827,1,-0.9239,0,0,-1,-0.7071,0,-0.7071],
// 4 16 0 1 -1 0.3827 1 -0.9239 0.3827 0 -0.9239 0 0 -1
  [4,16,0,1,-1,0.3827,1,-0.9239,0.3827,0,-0.9239,0,0,-1],
// 5 24 0 0 -1 0 1 -1 0.3827 0 -0.9239 -0.3827 0 -0.9239
  [5,24,0,0,-1,0,1,-1,0.3827,0,-0.9239,-0.3827,0,-0.9239],
// 4 16 0.3827 1 -0.9239 0.7071 1 -0.7071 0.7071 0 -0.7071 0.3827 0 -0.9239
  [4,16,0.3827,1,-0.9239,0.7071,1,-0.7071,0.7071,0,-0.7071,0.3827,0,-0.9239],
// 5 24 0.3827 0 -0.9239 0.3827 1 -0.9239 0.7071 0 -0.7071 0 0 -1
  [5,24,0.3827,0,-0.9239,0.3827,1,-0.9239,0.7071,0,-0.7071,0,0,-1],
// 4 16 0.7071 1 -0.7071 0.9239 1 -0.3827 0.9239 0 -0.3827 0.7071 0 -0.7071
  [4,16,0.7071,1,-0.7071,0.9239,1,-0.3827,0.9239,0,-0.3827,0.7071,0,-0.7071],
// 5 24 0.7071 0 -0.7071 0.7071 1 -0.7071 0.9239 0 -0.3827 0.3827 0 -0.9239
  [5,24,0.7071,0,-0.7071,0.7071,1,-0.7071,0.9239,0,-0.3827,0.3827,0,-0.9239],
// 4 16 0.9239 1 -0.3827 1 1 0 1 0 0 0.9239 0 -0.3827
  [4,16,0.9239,1,-0.3827,1,1,0,1,0,0,0.9239,0,-0.3827],
// 5 24 0.9239 0 -0.3827 0.9239 1 -0.3827 1 0 0 0.7071 0 -0.7071
  [5,24,0.9239,0,-0.3827,0.9239,1,-0.3827,1,0,0,0.7071,0,-0.7071],
// 0
];
module ldraw_lib__4_4cyli(step=0, col=false, unit=2/5, alt=false, line=0.2, solid=!$preview)
    makepoly(ldraw_lib__4_4cyli(solid), step=step, col=col, unit=unit, alt=alt, line=line, solid=solid);
ldraw_lib__4_4cyli(line=0.2);
// main file
use <../lib.scad>
use <../p/4-4cyli.scad>
use <../p/4-4edge.scad>
use <../p/4-4ring1.scad>
$fa=1; $fs=0.2;
function ldraw_lib__566(realsolid=false) = [
// 0 ~Electric Motor Case  4 x 12 x  3.333 Type 1 - Axle
// 0 Name: 566.dat
// 0 Author: Guy Vivan [guyvivan]
// 0 !LDRAW_ORG Part UPDATE 2012-01
// 0 !LICENSE Licensed under CC BY 2.0 and CC BY 4.0 : see CAreadme.txt
// 
// 0 BFC CERTIFY CCW
  [0,"BFC","CERTIFY"],
  [0,"BFC","CCW"],
// 
// 0 !HISTORY 2012-03-30 [PTadmin] Official Update 2012-01
// 
// 
// 1 16 -36 0 0 0 72 0 0 0 6 6 0 0 4-4cyli.dat
  [1,16,-36,0,0,0,72,0,0,0,6,6,0,0, ldraw_lib__4_4cyli(realsolid)],
// 1 16 -36 0 0 0 1 0 0 0 6 6 0 0 4-4edge.dat
  [1,16,-36,0,0,0,1,0,0,0,6,6,0,0, ldraw_lib__4_4edge(realsolid)],
// 1 16 36 0 0 0 1 0 0 0 6 6 0 0 4-4edge.dat
  [1,16,36,0,0,0,1,0,0,0,6,6,0,0, ldraw_lib__4_4edge(realsolid)],
// 0 BFC INVERTNEXT
  [0,"BFC","INVERTNEXT"],
// 1 16 -36 0 0 0 72 0 0 0 3 3 0 0 4-4cyli.dat
  [1,16,-36,0,0,0,72,0,0,0,3,3,0,0, ldraw_lib__4_4cyli(realsolid)],
// 1 16 -36 0 0 0 1 0 0 0 3 3 0 0 4-4edge.dat
  [1,16,-36,0,0,0,1,0,0,0,3,3,0,0, ldraw_lib__4_4edge(realsolid)],
// 1 16 36 0 0 0 1 0 0 0 3 3 0 0 4-4edge.dat
  [1,16,36,0,0,0,1,0,0,0,3,3,0,0, ldraw_lib__4_4edge(realsolid)],
// 1 16 -36 0 0 0 1 0 0 0 3 3 0 0 4-4ring1.dat
  [1,16,-36,0,0,0,1,0,0,0,3,3,0,0, ldraw_lib__4_4ring1(realsolid)],
// 1 16 36 0 0 0 -1 0 0 0 3 3 0 0 4-4ring1.dat
  [1,16,36,0,0,0,-1,0,0,0,3,3,0,0, ldraw_lib__4_4ring1(realsolid)],
// 0
];
module ldraw_lib__566(step=0, col=false, unit=2/5, alt=false, line=0.2, solid=!$preview)
    makepoly(ldraw_lib__566(solid), step=step, col=col, unit=unit, alt=alt, line=line, solid=solid);
ldraw_lib__566(line=0.2);
